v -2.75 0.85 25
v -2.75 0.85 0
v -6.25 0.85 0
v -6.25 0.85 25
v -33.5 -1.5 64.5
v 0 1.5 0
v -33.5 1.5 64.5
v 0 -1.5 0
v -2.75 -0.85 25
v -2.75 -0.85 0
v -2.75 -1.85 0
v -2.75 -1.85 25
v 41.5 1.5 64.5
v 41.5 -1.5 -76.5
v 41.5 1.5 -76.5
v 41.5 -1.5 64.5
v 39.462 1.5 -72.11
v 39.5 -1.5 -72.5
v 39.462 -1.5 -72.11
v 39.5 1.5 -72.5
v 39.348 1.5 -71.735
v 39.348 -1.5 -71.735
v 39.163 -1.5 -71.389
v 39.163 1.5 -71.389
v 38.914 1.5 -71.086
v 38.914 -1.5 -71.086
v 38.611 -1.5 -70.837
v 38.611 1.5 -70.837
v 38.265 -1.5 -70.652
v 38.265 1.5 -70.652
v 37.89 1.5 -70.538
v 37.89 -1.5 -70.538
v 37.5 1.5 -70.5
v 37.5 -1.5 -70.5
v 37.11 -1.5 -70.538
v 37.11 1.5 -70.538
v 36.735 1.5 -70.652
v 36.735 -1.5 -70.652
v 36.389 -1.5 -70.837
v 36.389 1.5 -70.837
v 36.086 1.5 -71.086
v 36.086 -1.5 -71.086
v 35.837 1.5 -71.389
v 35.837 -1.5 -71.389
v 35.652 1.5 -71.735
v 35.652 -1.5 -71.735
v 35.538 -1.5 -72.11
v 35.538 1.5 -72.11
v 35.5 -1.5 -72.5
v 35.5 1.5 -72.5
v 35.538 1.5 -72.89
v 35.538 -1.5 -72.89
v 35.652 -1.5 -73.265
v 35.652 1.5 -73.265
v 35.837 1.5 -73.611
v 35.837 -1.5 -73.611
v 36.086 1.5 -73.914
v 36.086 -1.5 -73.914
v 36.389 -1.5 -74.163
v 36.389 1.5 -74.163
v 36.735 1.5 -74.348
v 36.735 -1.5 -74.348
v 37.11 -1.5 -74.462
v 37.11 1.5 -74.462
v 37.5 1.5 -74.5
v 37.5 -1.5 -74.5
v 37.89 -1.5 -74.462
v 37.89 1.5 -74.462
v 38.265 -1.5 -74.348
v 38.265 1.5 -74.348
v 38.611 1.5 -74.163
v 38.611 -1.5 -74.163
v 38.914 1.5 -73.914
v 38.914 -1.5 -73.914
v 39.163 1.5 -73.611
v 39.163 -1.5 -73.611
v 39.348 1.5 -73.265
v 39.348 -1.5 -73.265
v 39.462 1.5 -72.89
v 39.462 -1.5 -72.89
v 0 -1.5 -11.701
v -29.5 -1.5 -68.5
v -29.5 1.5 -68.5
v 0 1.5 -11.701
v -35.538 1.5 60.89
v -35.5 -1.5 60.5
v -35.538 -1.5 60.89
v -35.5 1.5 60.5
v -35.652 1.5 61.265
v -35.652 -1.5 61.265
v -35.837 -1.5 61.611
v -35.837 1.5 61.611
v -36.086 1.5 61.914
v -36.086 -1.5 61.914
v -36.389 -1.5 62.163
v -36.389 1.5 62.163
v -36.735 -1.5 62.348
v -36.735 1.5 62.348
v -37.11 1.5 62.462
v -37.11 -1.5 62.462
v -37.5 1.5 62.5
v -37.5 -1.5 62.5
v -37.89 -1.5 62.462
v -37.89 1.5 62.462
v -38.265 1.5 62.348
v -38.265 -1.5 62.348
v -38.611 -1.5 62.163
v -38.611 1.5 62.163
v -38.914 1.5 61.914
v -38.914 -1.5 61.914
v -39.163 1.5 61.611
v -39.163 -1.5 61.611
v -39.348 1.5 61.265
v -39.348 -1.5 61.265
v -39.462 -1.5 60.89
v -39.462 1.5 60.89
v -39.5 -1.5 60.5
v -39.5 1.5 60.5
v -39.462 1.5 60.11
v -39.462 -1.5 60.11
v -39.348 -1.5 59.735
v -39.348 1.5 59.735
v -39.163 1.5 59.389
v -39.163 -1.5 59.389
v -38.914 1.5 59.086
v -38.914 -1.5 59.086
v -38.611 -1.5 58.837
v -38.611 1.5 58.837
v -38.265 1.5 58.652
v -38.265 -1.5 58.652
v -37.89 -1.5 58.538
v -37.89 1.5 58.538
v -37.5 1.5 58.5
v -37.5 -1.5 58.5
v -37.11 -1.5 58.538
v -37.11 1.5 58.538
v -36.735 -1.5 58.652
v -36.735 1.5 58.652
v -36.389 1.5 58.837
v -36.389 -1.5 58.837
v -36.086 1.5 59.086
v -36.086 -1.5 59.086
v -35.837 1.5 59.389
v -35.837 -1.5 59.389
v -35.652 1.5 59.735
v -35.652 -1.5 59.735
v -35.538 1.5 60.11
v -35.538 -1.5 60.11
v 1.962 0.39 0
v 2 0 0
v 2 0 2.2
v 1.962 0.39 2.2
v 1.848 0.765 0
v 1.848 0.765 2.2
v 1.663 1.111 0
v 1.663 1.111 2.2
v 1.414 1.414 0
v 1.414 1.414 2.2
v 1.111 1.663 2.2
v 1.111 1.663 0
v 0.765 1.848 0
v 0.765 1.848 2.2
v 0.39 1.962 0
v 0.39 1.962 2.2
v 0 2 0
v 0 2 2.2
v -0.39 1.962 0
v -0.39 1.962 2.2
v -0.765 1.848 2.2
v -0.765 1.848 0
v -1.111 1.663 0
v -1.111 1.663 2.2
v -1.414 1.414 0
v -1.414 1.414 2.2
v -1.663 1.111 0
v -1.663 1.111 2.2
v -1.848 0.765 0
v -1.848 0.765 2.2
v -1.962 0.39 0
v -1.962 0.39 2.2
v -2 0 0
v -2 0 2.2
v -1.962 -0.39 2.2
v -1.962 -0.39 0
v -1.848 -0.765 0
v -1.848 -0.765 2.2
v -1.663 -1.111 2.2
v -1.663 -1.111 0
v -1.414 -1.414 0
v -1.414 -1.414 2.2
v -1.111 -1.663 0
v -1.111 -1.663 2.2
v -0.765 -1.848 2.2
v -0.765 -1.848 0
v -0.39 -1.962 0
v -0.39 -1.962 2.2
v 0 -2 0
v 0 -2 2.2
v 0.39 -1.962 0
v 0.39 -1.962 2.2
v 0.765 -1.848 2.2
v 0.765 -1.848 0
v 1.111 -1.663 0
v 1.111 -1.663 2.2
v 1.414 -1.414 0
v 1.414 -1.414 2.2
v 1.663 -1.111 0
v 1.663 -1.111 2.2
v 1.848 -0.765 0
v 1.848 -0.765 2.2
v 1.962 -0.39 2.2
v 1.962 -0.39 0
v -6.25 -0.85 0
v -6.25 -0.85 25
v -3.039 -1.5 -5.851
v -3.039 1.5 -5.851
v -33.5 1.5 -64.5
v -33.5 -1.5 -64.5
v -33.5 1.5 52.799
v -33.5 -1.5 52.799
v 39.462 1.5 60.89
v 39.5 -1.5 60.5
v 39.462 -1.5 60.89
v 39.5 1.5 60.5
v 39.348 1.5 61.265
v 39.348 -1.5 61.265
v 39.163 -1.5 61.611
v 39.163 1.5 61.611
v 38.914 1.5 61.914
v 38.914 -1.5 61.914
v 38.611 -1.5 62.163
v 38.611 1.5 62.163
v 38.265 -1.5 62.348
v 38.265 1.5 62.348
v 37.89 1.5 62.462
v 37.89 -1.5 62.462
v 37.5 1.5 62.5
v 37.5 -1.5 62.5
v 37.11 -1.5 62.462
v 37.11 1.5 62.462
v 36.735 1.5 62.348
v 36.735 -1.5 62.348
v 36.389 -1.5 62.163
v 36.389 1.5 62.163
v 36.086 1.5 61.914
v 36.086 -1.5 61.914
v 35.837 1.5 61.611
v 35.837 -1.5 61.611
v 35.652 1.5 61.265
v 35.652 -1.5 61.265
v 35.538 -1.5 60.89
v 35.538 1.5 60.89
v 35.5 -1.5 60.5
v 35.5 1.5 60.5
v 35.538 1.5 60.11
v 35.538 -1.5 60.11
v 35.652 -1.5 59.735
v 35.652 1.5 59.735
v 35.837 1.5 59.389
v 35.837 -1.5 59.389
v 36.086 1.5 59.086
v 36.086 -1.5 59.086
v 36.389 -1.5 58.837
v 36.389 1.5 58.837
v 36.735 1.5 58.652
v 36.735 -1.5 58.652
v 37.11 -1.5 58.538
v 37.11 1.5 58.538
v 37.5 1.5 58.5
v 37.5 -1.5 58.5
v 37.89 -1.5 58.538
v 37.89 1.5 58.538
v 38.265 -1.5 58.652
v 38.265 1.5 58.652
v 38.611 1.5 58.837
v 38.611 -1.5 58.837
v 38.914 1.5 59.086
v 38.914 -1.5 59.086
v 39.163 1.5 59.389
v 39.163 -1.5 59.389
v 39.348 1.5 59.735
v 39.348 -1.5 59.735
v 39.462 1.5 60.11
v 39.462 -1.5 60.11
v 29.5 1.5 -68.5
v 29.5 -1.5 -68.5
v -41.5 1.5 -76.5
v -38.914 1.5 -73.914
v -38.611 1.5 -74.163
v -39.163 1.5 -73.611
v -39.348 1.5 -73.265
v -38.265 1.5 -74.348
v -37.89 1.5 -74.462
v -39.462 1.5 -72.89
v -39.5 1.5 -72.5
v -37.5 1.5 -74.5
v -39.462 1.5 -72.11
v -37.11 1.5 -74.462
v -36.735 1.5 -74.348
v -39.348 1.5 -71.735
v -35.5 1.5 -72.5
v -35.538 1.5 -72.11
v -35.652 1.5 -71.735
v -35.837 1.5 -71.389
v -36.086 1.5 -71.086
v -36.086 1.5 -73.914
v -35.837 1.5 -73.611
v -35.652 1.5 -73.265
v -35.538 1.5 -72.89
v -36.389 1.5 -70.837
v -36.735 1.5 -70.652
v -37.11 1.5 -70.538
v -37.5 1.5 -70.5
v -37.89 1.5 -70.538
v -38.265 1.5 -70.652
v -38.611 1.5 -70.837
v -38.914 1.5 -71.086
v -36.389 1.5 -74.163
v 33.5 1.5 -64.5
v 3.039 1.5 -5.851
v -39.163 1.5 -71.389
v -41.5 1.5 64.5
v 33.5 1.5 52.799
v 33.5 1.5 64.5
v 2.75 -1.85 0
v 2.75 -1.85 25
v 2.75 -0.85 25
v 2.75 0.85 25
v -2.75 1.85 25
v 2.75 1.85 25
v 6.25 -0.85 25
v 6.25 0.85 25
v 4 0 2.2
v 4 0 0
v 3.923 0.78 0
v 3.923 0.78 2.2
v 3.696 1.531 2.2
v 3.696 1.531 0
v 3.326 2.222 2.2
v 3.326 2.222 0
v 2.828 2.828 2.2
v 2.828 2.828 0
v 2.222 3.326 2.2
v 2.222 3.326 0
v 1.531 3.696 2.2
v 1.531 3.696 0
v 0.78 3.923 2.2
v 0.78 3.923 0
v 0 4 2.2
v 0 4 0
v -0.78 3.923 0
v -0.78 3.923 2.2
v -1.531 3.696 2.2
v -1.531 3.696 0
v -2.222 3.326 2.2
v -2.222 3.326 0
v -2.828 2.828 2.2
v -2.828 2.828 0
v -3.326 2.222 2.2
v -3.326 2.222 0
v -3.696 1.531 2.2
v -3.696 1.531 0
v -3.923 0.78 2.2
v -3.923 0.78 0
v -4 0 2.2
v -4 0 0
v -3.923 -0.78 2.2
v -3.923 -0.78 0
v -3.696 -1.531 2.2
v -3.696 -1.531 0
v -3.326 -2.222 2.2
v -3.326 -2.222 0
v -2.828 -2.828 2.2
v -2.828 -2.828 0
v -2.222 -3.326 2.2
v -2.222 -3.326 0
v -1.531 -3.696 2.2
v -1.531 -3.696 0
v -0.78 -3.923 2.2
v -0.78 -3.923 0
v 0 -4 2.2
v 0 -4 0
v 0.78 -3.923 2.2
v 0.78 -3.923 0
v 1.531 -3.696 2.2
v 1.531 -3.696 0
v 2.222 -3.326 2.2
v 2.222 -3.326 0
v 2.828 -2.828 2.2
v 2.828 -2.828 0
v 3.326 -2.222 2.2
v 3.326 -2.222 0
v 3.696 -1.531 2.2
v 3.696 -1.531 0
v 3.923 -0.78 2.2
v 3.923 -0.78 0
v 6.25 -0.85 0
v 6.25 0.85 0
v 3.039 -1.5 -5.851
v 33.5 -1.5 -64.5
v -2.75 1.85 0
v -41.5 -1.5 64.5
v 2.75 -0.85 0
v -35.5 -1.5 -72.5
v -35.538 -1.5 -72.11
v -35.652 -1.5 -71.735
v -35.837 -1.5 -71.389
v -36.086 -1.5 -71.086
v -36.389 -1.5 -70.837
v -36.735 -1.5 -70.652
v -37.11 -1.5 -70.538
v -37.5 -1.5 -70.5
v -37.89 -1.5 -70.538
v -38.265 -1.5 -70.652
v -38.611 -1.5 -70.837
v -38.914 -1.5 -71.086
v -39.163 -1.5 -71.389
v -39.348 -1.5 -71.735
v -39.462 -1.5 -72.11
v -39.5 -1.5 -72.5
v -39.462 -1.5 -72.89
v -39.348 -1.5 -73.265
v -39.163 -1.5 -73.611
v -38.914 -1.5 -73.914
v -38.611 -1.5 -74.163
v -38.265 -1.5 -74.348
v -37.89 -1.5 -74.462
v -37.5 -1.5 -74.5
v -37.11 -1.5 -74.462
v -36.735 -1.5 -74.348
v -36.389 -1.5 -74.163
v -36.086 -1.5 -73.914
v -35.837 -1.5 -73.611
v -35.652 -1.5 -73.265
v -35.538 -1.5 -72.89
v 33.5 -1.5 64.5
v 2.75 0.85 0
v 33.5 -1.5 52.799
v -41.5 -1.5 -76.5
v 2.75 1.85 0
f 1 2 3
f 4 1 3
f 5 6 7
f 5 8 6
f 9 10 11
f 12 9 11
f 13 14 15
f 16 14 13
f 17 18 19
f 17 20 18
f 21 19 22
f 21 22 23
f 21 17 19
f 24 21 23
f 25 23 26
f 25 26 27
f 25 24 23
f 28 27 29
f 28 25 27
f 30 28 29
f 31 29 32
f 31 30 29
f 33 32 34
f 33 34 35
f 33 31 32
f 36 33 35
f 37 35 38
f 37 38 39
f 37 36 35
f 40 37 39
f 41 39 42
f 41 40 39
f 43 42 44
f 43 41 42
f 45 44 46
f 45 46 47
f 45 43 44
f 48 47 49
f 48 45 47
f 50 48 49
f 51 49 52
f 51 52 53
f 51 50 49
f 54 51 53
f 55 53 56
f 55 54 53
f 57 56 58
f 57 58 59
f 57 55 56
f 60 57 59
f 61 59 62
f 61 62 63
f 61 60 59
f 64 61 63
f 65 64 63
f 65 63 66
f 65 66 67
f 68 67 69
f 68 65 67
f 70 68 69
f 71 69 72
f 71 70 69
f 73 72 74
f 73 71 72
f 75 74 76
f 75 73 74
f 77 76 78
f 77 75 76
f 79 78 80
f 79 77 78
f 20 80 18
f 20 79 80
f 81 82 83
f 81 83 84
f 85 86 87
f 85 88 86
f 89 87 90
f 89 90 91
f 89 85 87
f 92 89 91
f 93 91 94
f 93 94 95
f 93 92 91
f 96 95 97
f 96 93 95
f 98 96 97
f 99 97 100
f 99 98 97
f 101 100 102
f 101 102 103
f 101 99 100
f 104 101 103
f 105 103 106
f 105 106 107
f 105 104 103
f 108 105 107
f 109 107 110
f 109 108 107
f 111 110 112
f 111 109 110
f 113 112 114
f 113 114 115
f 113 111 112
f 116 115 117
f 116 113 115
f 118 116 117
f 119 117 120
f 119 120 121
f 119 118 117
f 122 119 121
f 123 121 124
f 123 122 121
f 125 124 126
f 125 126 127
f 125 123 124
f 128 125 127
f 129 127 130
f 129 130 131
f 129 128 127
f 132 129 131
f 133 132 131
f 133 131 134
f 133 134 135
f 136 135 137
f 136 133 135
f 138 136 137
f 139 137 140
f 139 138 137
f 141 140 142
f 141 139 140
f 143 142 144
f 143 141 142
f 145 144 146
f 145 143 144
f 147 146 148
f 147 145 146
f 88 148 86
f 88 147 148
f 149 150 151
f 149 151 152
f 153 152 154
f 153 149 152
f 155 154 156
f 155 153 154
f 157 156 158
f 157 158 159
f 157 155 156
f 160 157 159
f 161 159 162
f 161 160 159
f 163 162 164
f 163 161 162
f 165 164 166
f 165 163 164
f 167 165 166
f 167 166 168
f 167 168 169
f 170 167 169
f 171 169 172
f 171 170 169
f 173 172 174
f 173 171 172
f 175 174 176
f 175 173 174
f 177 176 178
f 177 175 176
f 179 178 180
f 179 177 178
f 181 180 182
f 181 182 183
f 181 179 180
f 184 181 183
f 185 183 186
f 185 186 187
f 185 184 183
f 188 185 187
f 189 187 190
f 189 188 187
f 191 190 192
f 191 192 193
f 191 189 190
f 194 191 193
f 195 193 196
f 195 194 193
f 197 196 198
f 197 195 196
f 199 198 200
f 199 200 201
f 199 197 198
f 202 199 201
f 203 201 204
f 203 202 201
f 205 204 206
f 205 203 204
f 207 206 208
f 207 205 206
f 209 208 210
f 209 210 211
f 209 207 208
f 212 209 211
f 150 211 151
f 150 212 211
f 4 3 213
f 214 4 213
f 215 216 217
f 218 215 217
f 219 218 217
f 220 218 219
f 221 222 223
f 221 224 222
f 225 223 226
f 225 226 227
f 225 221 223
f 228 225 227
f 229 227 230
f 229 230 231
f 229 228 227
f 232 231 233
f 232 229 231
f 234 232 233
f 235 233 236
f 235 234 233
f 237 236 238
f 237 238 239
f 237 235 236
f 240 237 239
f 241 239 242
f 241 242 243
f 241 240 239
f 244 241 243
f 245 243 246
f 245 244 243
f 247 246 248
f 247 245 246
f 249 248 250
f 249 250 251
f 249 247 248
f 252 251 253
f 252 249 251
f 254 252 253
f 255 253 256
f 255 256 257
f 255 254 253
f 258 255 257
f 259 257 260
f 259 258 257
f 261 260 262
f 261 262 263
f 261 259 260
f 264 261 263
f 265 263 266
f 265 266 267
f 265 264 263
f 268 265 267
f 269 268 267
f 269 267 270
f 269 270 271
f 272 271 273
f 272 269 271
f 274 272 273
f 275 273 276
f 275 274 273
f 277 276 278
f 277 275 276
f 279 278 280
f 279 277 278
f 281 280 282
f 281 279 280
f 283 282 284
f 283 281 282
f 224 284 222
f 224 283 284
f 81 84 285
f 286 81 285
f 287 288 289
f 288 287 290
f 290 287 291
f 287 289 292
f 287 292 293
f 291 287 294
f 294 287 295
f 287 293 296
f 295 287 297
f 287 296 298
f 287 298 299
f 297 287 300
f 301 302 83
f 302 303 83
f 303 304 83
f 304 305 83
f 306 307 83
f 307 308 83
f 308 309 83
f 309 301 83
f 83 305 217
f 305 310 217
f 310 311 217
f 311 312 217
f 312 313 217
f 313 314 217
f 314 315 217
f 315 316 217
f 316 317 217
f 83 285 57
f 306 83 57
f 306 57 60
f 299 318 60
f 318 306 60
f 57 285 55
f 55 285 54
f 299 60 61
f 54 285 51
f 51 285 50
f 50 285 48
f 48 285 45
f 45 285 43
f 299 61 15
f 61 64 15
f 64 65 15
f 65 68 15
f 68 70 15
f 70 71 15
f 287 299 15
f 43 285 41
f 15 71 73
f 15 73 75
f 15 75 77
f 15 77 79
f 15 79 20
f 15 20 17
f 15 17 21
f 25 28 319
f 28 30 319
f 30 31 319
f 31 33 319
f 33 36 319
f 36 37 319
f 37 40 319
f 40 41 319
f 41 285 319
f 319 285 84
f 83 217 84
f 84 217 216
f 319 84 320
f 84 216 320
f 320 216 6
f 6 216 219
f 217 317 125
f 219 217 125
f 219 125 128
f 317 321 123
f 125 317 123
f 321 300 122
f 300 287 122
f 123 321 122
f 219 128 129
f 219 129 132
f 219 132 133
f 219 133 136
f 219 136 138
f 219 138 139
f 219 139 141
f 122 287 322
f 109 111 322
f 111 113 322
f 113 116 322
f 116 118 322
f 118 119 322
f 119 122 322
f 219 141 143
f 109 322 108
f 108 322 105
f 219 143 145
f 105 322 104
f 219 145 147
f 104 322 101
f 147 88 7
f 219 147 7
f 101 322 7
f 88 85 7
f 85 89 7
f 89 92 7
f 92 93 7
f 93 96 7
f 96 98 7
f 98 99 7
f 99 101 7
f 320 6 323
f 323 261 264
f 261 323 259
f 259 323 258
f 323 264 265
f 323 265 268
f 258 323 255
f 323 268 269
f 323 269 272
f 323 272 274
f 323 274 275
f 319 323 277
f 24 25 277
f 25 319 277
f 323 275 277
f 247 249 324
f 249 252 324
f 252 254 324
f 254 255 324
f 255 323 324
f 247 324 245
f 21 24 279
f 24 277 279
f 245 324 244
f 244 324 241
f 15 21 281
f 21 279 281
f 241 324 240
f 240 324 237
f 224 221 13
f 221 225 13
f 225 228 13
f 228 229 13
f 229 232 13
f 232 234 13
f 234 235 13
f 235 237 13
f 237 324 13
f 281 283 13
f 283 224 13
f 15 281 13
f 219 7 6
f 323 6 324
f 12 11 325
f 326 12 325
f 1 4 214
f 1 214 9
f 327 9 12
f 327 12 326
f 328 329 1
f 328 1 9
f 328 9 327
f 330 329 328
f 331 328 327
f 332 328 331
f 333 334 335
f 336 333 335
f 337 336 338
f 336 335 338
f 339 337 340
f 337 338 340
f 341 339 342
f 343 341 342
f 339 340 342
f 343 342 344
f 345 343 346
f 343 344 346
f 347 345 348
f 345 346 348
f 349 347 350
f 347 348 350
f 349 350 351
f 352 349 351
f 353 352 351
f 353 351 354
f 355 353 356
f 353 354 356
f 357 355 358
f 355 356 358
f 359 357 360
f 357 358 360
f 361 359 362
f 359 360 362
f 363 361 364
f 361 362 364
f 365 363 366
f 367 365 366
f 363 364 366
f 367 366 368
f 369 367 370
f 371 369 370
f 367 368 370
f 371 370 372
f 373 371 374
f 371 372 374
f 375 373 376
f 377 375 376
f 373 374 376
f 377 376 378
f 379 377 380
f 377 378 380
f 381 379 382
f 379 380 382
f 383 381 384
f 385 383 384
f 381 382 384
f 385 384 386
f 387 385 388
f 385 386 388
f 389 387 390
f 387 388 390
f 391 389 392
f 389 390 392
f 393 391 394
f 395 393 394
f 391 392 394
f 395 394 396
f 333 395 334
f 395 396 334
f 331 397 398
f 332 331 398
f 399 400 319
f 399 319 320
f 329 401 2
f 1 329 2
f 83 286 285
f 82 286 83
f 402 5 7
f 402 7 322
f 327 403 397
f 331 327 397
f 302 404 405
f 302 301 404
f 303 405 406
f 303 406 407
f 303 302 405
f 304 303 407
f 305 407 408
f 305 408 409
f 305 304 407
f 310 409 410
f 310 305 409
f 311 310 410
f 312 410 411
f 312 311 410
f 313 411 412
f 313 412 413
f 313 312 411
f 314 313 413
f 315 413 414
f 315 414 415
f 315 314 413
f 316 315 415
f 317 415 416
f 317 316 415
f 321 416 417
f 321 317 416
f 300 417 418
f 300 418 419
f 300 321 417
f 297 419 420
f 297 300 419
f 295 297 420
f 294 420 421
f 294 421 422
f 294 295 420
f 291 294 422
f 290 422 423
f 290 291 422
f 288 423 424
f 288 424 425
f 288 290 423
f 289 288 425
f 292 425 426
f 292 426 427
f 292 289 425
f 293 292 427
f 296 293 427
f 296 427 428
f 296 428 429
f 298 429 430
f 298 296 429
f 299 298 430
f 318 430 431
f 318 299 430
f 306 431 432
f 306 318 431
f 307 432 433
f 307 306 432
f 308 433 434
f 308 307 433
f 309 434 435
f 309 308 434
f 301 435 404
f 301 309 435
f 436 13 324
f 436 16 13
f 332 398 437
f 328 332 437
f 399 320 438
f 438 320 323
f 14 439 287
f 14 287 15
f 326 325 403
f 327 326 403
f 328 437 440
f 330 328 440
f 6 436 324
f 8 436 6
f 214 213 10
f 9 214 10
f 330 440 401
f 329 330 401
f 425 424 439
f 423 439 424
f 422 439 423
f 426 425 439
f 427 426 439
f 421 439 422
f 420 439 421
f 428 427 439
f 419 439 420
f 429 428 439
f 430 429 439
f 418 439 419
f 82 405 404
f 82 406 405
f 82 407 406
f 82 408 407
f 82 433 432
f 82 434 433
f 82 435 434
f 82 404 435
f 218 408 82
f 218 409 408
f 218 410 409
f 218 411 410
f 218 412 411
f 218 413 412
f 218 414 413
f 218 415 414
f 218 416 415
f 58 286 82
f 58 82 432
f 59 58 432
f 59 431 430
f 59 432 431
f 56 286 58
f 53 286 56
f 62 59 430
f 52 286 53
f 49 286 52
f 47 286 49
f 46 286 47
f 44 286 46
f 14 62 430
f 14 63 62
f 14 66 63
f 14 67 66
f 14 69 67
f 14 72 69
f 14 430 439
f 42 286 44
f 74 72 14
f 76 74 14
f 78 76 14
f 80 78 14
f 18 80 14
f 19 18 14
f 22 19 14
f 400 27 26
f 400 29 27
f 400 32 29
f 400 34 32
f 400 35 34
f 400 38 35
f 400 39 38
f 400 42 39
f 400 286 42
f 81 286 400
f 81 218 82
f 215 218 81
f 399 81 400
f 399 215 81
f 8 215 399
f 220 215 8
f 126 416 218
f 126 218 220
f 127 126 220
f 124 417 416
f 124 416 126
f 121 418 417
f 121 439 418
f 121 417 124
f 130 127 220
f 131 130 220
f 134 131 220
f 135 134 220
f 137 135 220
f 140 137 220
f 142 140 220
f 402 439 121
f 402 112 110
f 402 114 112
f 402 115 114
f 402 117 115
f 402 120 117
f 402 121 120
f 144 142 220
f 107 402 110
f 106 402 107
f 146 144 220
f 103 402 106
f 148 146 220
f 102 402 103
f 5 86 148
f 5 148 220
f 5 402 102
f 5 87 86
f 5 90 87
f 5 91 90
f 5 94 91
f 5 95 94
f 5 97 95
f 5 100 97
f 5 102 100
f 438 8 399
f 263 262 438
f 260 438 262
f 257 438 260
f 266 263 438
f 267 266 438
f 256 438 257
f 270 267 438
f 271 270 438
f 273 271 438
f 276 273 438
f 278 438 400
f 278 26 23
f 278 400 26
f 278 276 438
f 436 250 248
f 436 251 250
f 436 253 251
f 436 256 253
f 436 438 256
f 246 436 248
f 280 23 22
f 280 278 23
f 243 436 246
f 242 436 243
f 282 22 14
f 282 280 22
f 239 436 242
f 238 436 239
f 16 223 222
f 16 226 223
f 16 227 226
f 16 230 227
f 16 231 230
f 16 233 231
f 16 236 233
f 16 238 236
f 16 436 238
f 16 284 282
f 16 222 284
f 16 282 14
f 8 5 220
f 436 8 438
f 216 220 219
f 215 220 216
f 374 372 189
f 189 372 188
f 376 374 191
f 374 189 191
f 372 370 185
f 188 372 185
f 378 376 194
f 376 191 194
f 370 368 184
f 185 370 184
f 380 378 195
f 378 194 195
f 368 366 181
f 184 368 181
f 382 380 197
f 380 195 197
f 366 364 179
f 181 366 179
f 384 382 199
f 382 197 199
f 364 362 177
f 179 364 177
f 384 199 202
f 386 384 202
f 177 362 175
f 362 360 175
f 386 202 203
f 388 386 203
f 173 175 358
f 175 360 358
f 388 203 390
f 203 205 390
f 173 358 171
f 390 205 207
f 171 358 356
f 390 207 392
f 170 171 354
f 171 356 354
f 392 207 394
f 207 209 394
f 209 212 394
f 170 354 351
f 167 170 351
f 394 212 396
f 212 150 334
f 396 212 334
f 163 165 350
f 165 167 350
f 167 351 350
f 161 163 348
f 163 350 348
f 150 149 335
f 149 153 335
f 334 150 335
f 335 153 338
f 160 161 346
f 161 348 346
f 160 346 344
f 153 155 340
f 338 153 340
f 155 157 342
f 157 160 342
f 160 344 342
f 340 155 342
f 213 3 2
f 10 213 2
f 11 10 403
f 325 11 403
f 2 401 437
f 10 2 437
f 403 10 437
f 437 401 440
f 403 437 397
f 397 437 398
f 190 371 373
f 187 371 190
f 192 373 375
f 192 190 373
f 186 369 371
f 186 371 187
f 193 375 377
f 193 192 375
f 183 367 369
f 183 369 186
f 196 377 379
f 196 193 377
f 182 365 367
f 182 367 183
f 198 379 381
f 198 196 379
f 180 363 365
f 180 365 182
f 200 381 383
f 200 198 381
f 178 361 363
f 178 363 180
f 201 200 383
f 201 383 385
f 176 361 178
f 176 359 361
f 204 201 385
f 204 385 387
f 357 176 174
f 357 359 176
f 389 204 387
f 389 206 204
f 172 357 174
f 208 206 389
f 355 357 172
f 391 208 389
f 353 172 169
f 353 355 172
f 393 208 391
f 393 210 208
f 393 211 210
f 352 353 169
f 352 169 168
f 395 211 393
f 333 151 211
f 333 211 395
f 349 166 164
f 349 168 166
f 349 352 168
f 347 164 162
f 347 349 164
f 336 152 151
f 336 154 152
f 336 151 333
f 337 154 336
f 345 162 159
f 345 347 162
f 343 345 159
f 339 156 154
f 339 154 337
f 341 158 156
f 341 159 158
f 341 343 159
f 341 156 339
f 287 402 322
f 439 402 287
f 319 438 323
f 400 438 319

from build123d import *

# Parameters (mm, degrees)
F1_DEPTH = 25
F2_R     = 2
F3_DEPTH = 1.5
F4_R     = 4
F4_R_2   = 2
F5_DEPTH = 2.2


with BuildPart() as f1:
    # F0 (on Top) → F1 (new body)
    with BuildSketch(Plane.XY):
        Polygon((-6.25, 0.85), (-6.25, -0.85), (-2.75, -0.85), (-2.75, -1.85), (2.75, -1.85), (2.75, -0.85), (6.25, -0.85), (6.25, 0.85), (2.75, 0.85), (2.75, 1.85), (-2.75, 1.85), (-2.75, 0.85), align=None)
    extrude(amount=F1_DEPTH)


with BuildPart() as f3:
    # F2 (on Front) → F3 (new body, symmetric)
    with BuildSketch(Plane.XZ):
        Polygon((3.0387596899, -5.8507462687), (0, 0), (-3.0387596899, -5.8507462687), (0, -11.7014925373), align=None)
        Polygon((0, 0), (-33.5, 64.5), (-33.5, 52.7985074627), (-3.0387596899, -5.8507462687), align=None)
        Polygon((33.5, -64.5), (3.0387596899, -5.8507462687), (0, -11.7014925373), (29.5, -68.5), (33.5, -68.5), align=None)
        Polygon((33.5, 52.7985074627), (33.5, 64.5), (0, 0), (3.0387596899, -5.8507462687), align=None)
        Polygon((-3.0387596899, -5.8507462687), (-33.5, -64.5), (-33.5, -68.5), (-29.5, -68.5), (0, -11.7014925373), align=None)
        Polygon((-41.5, 64.5), (-41.5, -76.5), (41.5, -76.5), (41.5, 64.5), (33.5, 64.5), (33.5, 52.7985074627), (33.5, -64.5), (33.5, -68.5), (29.5, -68.5), (-29.5, -68.5), (-33.5, -68.5), (-33.5, -64.5), (-33.5, 52.7985074627), (-33.5, 64.5), align=None)
        with Locations((-37.5, -72.5)):
            Circle(F2_R, mode=Mode.SUBTRACT)
        with Locations((37.5, -72.5)):
            Circle(F2_R, mode=Mode.SUBTRACT)
        with Locations((-37.5, 60.5)):
            Circle(F2_R, mode=Mode.SUBTRACT)
        with Locations((37.5, 60.5)):
            Circle(F2_R, mode=Mode.SUBTRACT)
    extrude(amount=F3_DEPTH, both=True)


with BuildPart() as f5:
    # F4 (on Top) → F5 (new body)
    with BuildSketch(Plane.XY):
        Circle(F4_R)
        Circle(F4_R_2, mode=Mode.SUBTRACT)
    extrude(amount=F5_DEPTH)


solid = Compound([f1.part, f3.part, f5.part])
